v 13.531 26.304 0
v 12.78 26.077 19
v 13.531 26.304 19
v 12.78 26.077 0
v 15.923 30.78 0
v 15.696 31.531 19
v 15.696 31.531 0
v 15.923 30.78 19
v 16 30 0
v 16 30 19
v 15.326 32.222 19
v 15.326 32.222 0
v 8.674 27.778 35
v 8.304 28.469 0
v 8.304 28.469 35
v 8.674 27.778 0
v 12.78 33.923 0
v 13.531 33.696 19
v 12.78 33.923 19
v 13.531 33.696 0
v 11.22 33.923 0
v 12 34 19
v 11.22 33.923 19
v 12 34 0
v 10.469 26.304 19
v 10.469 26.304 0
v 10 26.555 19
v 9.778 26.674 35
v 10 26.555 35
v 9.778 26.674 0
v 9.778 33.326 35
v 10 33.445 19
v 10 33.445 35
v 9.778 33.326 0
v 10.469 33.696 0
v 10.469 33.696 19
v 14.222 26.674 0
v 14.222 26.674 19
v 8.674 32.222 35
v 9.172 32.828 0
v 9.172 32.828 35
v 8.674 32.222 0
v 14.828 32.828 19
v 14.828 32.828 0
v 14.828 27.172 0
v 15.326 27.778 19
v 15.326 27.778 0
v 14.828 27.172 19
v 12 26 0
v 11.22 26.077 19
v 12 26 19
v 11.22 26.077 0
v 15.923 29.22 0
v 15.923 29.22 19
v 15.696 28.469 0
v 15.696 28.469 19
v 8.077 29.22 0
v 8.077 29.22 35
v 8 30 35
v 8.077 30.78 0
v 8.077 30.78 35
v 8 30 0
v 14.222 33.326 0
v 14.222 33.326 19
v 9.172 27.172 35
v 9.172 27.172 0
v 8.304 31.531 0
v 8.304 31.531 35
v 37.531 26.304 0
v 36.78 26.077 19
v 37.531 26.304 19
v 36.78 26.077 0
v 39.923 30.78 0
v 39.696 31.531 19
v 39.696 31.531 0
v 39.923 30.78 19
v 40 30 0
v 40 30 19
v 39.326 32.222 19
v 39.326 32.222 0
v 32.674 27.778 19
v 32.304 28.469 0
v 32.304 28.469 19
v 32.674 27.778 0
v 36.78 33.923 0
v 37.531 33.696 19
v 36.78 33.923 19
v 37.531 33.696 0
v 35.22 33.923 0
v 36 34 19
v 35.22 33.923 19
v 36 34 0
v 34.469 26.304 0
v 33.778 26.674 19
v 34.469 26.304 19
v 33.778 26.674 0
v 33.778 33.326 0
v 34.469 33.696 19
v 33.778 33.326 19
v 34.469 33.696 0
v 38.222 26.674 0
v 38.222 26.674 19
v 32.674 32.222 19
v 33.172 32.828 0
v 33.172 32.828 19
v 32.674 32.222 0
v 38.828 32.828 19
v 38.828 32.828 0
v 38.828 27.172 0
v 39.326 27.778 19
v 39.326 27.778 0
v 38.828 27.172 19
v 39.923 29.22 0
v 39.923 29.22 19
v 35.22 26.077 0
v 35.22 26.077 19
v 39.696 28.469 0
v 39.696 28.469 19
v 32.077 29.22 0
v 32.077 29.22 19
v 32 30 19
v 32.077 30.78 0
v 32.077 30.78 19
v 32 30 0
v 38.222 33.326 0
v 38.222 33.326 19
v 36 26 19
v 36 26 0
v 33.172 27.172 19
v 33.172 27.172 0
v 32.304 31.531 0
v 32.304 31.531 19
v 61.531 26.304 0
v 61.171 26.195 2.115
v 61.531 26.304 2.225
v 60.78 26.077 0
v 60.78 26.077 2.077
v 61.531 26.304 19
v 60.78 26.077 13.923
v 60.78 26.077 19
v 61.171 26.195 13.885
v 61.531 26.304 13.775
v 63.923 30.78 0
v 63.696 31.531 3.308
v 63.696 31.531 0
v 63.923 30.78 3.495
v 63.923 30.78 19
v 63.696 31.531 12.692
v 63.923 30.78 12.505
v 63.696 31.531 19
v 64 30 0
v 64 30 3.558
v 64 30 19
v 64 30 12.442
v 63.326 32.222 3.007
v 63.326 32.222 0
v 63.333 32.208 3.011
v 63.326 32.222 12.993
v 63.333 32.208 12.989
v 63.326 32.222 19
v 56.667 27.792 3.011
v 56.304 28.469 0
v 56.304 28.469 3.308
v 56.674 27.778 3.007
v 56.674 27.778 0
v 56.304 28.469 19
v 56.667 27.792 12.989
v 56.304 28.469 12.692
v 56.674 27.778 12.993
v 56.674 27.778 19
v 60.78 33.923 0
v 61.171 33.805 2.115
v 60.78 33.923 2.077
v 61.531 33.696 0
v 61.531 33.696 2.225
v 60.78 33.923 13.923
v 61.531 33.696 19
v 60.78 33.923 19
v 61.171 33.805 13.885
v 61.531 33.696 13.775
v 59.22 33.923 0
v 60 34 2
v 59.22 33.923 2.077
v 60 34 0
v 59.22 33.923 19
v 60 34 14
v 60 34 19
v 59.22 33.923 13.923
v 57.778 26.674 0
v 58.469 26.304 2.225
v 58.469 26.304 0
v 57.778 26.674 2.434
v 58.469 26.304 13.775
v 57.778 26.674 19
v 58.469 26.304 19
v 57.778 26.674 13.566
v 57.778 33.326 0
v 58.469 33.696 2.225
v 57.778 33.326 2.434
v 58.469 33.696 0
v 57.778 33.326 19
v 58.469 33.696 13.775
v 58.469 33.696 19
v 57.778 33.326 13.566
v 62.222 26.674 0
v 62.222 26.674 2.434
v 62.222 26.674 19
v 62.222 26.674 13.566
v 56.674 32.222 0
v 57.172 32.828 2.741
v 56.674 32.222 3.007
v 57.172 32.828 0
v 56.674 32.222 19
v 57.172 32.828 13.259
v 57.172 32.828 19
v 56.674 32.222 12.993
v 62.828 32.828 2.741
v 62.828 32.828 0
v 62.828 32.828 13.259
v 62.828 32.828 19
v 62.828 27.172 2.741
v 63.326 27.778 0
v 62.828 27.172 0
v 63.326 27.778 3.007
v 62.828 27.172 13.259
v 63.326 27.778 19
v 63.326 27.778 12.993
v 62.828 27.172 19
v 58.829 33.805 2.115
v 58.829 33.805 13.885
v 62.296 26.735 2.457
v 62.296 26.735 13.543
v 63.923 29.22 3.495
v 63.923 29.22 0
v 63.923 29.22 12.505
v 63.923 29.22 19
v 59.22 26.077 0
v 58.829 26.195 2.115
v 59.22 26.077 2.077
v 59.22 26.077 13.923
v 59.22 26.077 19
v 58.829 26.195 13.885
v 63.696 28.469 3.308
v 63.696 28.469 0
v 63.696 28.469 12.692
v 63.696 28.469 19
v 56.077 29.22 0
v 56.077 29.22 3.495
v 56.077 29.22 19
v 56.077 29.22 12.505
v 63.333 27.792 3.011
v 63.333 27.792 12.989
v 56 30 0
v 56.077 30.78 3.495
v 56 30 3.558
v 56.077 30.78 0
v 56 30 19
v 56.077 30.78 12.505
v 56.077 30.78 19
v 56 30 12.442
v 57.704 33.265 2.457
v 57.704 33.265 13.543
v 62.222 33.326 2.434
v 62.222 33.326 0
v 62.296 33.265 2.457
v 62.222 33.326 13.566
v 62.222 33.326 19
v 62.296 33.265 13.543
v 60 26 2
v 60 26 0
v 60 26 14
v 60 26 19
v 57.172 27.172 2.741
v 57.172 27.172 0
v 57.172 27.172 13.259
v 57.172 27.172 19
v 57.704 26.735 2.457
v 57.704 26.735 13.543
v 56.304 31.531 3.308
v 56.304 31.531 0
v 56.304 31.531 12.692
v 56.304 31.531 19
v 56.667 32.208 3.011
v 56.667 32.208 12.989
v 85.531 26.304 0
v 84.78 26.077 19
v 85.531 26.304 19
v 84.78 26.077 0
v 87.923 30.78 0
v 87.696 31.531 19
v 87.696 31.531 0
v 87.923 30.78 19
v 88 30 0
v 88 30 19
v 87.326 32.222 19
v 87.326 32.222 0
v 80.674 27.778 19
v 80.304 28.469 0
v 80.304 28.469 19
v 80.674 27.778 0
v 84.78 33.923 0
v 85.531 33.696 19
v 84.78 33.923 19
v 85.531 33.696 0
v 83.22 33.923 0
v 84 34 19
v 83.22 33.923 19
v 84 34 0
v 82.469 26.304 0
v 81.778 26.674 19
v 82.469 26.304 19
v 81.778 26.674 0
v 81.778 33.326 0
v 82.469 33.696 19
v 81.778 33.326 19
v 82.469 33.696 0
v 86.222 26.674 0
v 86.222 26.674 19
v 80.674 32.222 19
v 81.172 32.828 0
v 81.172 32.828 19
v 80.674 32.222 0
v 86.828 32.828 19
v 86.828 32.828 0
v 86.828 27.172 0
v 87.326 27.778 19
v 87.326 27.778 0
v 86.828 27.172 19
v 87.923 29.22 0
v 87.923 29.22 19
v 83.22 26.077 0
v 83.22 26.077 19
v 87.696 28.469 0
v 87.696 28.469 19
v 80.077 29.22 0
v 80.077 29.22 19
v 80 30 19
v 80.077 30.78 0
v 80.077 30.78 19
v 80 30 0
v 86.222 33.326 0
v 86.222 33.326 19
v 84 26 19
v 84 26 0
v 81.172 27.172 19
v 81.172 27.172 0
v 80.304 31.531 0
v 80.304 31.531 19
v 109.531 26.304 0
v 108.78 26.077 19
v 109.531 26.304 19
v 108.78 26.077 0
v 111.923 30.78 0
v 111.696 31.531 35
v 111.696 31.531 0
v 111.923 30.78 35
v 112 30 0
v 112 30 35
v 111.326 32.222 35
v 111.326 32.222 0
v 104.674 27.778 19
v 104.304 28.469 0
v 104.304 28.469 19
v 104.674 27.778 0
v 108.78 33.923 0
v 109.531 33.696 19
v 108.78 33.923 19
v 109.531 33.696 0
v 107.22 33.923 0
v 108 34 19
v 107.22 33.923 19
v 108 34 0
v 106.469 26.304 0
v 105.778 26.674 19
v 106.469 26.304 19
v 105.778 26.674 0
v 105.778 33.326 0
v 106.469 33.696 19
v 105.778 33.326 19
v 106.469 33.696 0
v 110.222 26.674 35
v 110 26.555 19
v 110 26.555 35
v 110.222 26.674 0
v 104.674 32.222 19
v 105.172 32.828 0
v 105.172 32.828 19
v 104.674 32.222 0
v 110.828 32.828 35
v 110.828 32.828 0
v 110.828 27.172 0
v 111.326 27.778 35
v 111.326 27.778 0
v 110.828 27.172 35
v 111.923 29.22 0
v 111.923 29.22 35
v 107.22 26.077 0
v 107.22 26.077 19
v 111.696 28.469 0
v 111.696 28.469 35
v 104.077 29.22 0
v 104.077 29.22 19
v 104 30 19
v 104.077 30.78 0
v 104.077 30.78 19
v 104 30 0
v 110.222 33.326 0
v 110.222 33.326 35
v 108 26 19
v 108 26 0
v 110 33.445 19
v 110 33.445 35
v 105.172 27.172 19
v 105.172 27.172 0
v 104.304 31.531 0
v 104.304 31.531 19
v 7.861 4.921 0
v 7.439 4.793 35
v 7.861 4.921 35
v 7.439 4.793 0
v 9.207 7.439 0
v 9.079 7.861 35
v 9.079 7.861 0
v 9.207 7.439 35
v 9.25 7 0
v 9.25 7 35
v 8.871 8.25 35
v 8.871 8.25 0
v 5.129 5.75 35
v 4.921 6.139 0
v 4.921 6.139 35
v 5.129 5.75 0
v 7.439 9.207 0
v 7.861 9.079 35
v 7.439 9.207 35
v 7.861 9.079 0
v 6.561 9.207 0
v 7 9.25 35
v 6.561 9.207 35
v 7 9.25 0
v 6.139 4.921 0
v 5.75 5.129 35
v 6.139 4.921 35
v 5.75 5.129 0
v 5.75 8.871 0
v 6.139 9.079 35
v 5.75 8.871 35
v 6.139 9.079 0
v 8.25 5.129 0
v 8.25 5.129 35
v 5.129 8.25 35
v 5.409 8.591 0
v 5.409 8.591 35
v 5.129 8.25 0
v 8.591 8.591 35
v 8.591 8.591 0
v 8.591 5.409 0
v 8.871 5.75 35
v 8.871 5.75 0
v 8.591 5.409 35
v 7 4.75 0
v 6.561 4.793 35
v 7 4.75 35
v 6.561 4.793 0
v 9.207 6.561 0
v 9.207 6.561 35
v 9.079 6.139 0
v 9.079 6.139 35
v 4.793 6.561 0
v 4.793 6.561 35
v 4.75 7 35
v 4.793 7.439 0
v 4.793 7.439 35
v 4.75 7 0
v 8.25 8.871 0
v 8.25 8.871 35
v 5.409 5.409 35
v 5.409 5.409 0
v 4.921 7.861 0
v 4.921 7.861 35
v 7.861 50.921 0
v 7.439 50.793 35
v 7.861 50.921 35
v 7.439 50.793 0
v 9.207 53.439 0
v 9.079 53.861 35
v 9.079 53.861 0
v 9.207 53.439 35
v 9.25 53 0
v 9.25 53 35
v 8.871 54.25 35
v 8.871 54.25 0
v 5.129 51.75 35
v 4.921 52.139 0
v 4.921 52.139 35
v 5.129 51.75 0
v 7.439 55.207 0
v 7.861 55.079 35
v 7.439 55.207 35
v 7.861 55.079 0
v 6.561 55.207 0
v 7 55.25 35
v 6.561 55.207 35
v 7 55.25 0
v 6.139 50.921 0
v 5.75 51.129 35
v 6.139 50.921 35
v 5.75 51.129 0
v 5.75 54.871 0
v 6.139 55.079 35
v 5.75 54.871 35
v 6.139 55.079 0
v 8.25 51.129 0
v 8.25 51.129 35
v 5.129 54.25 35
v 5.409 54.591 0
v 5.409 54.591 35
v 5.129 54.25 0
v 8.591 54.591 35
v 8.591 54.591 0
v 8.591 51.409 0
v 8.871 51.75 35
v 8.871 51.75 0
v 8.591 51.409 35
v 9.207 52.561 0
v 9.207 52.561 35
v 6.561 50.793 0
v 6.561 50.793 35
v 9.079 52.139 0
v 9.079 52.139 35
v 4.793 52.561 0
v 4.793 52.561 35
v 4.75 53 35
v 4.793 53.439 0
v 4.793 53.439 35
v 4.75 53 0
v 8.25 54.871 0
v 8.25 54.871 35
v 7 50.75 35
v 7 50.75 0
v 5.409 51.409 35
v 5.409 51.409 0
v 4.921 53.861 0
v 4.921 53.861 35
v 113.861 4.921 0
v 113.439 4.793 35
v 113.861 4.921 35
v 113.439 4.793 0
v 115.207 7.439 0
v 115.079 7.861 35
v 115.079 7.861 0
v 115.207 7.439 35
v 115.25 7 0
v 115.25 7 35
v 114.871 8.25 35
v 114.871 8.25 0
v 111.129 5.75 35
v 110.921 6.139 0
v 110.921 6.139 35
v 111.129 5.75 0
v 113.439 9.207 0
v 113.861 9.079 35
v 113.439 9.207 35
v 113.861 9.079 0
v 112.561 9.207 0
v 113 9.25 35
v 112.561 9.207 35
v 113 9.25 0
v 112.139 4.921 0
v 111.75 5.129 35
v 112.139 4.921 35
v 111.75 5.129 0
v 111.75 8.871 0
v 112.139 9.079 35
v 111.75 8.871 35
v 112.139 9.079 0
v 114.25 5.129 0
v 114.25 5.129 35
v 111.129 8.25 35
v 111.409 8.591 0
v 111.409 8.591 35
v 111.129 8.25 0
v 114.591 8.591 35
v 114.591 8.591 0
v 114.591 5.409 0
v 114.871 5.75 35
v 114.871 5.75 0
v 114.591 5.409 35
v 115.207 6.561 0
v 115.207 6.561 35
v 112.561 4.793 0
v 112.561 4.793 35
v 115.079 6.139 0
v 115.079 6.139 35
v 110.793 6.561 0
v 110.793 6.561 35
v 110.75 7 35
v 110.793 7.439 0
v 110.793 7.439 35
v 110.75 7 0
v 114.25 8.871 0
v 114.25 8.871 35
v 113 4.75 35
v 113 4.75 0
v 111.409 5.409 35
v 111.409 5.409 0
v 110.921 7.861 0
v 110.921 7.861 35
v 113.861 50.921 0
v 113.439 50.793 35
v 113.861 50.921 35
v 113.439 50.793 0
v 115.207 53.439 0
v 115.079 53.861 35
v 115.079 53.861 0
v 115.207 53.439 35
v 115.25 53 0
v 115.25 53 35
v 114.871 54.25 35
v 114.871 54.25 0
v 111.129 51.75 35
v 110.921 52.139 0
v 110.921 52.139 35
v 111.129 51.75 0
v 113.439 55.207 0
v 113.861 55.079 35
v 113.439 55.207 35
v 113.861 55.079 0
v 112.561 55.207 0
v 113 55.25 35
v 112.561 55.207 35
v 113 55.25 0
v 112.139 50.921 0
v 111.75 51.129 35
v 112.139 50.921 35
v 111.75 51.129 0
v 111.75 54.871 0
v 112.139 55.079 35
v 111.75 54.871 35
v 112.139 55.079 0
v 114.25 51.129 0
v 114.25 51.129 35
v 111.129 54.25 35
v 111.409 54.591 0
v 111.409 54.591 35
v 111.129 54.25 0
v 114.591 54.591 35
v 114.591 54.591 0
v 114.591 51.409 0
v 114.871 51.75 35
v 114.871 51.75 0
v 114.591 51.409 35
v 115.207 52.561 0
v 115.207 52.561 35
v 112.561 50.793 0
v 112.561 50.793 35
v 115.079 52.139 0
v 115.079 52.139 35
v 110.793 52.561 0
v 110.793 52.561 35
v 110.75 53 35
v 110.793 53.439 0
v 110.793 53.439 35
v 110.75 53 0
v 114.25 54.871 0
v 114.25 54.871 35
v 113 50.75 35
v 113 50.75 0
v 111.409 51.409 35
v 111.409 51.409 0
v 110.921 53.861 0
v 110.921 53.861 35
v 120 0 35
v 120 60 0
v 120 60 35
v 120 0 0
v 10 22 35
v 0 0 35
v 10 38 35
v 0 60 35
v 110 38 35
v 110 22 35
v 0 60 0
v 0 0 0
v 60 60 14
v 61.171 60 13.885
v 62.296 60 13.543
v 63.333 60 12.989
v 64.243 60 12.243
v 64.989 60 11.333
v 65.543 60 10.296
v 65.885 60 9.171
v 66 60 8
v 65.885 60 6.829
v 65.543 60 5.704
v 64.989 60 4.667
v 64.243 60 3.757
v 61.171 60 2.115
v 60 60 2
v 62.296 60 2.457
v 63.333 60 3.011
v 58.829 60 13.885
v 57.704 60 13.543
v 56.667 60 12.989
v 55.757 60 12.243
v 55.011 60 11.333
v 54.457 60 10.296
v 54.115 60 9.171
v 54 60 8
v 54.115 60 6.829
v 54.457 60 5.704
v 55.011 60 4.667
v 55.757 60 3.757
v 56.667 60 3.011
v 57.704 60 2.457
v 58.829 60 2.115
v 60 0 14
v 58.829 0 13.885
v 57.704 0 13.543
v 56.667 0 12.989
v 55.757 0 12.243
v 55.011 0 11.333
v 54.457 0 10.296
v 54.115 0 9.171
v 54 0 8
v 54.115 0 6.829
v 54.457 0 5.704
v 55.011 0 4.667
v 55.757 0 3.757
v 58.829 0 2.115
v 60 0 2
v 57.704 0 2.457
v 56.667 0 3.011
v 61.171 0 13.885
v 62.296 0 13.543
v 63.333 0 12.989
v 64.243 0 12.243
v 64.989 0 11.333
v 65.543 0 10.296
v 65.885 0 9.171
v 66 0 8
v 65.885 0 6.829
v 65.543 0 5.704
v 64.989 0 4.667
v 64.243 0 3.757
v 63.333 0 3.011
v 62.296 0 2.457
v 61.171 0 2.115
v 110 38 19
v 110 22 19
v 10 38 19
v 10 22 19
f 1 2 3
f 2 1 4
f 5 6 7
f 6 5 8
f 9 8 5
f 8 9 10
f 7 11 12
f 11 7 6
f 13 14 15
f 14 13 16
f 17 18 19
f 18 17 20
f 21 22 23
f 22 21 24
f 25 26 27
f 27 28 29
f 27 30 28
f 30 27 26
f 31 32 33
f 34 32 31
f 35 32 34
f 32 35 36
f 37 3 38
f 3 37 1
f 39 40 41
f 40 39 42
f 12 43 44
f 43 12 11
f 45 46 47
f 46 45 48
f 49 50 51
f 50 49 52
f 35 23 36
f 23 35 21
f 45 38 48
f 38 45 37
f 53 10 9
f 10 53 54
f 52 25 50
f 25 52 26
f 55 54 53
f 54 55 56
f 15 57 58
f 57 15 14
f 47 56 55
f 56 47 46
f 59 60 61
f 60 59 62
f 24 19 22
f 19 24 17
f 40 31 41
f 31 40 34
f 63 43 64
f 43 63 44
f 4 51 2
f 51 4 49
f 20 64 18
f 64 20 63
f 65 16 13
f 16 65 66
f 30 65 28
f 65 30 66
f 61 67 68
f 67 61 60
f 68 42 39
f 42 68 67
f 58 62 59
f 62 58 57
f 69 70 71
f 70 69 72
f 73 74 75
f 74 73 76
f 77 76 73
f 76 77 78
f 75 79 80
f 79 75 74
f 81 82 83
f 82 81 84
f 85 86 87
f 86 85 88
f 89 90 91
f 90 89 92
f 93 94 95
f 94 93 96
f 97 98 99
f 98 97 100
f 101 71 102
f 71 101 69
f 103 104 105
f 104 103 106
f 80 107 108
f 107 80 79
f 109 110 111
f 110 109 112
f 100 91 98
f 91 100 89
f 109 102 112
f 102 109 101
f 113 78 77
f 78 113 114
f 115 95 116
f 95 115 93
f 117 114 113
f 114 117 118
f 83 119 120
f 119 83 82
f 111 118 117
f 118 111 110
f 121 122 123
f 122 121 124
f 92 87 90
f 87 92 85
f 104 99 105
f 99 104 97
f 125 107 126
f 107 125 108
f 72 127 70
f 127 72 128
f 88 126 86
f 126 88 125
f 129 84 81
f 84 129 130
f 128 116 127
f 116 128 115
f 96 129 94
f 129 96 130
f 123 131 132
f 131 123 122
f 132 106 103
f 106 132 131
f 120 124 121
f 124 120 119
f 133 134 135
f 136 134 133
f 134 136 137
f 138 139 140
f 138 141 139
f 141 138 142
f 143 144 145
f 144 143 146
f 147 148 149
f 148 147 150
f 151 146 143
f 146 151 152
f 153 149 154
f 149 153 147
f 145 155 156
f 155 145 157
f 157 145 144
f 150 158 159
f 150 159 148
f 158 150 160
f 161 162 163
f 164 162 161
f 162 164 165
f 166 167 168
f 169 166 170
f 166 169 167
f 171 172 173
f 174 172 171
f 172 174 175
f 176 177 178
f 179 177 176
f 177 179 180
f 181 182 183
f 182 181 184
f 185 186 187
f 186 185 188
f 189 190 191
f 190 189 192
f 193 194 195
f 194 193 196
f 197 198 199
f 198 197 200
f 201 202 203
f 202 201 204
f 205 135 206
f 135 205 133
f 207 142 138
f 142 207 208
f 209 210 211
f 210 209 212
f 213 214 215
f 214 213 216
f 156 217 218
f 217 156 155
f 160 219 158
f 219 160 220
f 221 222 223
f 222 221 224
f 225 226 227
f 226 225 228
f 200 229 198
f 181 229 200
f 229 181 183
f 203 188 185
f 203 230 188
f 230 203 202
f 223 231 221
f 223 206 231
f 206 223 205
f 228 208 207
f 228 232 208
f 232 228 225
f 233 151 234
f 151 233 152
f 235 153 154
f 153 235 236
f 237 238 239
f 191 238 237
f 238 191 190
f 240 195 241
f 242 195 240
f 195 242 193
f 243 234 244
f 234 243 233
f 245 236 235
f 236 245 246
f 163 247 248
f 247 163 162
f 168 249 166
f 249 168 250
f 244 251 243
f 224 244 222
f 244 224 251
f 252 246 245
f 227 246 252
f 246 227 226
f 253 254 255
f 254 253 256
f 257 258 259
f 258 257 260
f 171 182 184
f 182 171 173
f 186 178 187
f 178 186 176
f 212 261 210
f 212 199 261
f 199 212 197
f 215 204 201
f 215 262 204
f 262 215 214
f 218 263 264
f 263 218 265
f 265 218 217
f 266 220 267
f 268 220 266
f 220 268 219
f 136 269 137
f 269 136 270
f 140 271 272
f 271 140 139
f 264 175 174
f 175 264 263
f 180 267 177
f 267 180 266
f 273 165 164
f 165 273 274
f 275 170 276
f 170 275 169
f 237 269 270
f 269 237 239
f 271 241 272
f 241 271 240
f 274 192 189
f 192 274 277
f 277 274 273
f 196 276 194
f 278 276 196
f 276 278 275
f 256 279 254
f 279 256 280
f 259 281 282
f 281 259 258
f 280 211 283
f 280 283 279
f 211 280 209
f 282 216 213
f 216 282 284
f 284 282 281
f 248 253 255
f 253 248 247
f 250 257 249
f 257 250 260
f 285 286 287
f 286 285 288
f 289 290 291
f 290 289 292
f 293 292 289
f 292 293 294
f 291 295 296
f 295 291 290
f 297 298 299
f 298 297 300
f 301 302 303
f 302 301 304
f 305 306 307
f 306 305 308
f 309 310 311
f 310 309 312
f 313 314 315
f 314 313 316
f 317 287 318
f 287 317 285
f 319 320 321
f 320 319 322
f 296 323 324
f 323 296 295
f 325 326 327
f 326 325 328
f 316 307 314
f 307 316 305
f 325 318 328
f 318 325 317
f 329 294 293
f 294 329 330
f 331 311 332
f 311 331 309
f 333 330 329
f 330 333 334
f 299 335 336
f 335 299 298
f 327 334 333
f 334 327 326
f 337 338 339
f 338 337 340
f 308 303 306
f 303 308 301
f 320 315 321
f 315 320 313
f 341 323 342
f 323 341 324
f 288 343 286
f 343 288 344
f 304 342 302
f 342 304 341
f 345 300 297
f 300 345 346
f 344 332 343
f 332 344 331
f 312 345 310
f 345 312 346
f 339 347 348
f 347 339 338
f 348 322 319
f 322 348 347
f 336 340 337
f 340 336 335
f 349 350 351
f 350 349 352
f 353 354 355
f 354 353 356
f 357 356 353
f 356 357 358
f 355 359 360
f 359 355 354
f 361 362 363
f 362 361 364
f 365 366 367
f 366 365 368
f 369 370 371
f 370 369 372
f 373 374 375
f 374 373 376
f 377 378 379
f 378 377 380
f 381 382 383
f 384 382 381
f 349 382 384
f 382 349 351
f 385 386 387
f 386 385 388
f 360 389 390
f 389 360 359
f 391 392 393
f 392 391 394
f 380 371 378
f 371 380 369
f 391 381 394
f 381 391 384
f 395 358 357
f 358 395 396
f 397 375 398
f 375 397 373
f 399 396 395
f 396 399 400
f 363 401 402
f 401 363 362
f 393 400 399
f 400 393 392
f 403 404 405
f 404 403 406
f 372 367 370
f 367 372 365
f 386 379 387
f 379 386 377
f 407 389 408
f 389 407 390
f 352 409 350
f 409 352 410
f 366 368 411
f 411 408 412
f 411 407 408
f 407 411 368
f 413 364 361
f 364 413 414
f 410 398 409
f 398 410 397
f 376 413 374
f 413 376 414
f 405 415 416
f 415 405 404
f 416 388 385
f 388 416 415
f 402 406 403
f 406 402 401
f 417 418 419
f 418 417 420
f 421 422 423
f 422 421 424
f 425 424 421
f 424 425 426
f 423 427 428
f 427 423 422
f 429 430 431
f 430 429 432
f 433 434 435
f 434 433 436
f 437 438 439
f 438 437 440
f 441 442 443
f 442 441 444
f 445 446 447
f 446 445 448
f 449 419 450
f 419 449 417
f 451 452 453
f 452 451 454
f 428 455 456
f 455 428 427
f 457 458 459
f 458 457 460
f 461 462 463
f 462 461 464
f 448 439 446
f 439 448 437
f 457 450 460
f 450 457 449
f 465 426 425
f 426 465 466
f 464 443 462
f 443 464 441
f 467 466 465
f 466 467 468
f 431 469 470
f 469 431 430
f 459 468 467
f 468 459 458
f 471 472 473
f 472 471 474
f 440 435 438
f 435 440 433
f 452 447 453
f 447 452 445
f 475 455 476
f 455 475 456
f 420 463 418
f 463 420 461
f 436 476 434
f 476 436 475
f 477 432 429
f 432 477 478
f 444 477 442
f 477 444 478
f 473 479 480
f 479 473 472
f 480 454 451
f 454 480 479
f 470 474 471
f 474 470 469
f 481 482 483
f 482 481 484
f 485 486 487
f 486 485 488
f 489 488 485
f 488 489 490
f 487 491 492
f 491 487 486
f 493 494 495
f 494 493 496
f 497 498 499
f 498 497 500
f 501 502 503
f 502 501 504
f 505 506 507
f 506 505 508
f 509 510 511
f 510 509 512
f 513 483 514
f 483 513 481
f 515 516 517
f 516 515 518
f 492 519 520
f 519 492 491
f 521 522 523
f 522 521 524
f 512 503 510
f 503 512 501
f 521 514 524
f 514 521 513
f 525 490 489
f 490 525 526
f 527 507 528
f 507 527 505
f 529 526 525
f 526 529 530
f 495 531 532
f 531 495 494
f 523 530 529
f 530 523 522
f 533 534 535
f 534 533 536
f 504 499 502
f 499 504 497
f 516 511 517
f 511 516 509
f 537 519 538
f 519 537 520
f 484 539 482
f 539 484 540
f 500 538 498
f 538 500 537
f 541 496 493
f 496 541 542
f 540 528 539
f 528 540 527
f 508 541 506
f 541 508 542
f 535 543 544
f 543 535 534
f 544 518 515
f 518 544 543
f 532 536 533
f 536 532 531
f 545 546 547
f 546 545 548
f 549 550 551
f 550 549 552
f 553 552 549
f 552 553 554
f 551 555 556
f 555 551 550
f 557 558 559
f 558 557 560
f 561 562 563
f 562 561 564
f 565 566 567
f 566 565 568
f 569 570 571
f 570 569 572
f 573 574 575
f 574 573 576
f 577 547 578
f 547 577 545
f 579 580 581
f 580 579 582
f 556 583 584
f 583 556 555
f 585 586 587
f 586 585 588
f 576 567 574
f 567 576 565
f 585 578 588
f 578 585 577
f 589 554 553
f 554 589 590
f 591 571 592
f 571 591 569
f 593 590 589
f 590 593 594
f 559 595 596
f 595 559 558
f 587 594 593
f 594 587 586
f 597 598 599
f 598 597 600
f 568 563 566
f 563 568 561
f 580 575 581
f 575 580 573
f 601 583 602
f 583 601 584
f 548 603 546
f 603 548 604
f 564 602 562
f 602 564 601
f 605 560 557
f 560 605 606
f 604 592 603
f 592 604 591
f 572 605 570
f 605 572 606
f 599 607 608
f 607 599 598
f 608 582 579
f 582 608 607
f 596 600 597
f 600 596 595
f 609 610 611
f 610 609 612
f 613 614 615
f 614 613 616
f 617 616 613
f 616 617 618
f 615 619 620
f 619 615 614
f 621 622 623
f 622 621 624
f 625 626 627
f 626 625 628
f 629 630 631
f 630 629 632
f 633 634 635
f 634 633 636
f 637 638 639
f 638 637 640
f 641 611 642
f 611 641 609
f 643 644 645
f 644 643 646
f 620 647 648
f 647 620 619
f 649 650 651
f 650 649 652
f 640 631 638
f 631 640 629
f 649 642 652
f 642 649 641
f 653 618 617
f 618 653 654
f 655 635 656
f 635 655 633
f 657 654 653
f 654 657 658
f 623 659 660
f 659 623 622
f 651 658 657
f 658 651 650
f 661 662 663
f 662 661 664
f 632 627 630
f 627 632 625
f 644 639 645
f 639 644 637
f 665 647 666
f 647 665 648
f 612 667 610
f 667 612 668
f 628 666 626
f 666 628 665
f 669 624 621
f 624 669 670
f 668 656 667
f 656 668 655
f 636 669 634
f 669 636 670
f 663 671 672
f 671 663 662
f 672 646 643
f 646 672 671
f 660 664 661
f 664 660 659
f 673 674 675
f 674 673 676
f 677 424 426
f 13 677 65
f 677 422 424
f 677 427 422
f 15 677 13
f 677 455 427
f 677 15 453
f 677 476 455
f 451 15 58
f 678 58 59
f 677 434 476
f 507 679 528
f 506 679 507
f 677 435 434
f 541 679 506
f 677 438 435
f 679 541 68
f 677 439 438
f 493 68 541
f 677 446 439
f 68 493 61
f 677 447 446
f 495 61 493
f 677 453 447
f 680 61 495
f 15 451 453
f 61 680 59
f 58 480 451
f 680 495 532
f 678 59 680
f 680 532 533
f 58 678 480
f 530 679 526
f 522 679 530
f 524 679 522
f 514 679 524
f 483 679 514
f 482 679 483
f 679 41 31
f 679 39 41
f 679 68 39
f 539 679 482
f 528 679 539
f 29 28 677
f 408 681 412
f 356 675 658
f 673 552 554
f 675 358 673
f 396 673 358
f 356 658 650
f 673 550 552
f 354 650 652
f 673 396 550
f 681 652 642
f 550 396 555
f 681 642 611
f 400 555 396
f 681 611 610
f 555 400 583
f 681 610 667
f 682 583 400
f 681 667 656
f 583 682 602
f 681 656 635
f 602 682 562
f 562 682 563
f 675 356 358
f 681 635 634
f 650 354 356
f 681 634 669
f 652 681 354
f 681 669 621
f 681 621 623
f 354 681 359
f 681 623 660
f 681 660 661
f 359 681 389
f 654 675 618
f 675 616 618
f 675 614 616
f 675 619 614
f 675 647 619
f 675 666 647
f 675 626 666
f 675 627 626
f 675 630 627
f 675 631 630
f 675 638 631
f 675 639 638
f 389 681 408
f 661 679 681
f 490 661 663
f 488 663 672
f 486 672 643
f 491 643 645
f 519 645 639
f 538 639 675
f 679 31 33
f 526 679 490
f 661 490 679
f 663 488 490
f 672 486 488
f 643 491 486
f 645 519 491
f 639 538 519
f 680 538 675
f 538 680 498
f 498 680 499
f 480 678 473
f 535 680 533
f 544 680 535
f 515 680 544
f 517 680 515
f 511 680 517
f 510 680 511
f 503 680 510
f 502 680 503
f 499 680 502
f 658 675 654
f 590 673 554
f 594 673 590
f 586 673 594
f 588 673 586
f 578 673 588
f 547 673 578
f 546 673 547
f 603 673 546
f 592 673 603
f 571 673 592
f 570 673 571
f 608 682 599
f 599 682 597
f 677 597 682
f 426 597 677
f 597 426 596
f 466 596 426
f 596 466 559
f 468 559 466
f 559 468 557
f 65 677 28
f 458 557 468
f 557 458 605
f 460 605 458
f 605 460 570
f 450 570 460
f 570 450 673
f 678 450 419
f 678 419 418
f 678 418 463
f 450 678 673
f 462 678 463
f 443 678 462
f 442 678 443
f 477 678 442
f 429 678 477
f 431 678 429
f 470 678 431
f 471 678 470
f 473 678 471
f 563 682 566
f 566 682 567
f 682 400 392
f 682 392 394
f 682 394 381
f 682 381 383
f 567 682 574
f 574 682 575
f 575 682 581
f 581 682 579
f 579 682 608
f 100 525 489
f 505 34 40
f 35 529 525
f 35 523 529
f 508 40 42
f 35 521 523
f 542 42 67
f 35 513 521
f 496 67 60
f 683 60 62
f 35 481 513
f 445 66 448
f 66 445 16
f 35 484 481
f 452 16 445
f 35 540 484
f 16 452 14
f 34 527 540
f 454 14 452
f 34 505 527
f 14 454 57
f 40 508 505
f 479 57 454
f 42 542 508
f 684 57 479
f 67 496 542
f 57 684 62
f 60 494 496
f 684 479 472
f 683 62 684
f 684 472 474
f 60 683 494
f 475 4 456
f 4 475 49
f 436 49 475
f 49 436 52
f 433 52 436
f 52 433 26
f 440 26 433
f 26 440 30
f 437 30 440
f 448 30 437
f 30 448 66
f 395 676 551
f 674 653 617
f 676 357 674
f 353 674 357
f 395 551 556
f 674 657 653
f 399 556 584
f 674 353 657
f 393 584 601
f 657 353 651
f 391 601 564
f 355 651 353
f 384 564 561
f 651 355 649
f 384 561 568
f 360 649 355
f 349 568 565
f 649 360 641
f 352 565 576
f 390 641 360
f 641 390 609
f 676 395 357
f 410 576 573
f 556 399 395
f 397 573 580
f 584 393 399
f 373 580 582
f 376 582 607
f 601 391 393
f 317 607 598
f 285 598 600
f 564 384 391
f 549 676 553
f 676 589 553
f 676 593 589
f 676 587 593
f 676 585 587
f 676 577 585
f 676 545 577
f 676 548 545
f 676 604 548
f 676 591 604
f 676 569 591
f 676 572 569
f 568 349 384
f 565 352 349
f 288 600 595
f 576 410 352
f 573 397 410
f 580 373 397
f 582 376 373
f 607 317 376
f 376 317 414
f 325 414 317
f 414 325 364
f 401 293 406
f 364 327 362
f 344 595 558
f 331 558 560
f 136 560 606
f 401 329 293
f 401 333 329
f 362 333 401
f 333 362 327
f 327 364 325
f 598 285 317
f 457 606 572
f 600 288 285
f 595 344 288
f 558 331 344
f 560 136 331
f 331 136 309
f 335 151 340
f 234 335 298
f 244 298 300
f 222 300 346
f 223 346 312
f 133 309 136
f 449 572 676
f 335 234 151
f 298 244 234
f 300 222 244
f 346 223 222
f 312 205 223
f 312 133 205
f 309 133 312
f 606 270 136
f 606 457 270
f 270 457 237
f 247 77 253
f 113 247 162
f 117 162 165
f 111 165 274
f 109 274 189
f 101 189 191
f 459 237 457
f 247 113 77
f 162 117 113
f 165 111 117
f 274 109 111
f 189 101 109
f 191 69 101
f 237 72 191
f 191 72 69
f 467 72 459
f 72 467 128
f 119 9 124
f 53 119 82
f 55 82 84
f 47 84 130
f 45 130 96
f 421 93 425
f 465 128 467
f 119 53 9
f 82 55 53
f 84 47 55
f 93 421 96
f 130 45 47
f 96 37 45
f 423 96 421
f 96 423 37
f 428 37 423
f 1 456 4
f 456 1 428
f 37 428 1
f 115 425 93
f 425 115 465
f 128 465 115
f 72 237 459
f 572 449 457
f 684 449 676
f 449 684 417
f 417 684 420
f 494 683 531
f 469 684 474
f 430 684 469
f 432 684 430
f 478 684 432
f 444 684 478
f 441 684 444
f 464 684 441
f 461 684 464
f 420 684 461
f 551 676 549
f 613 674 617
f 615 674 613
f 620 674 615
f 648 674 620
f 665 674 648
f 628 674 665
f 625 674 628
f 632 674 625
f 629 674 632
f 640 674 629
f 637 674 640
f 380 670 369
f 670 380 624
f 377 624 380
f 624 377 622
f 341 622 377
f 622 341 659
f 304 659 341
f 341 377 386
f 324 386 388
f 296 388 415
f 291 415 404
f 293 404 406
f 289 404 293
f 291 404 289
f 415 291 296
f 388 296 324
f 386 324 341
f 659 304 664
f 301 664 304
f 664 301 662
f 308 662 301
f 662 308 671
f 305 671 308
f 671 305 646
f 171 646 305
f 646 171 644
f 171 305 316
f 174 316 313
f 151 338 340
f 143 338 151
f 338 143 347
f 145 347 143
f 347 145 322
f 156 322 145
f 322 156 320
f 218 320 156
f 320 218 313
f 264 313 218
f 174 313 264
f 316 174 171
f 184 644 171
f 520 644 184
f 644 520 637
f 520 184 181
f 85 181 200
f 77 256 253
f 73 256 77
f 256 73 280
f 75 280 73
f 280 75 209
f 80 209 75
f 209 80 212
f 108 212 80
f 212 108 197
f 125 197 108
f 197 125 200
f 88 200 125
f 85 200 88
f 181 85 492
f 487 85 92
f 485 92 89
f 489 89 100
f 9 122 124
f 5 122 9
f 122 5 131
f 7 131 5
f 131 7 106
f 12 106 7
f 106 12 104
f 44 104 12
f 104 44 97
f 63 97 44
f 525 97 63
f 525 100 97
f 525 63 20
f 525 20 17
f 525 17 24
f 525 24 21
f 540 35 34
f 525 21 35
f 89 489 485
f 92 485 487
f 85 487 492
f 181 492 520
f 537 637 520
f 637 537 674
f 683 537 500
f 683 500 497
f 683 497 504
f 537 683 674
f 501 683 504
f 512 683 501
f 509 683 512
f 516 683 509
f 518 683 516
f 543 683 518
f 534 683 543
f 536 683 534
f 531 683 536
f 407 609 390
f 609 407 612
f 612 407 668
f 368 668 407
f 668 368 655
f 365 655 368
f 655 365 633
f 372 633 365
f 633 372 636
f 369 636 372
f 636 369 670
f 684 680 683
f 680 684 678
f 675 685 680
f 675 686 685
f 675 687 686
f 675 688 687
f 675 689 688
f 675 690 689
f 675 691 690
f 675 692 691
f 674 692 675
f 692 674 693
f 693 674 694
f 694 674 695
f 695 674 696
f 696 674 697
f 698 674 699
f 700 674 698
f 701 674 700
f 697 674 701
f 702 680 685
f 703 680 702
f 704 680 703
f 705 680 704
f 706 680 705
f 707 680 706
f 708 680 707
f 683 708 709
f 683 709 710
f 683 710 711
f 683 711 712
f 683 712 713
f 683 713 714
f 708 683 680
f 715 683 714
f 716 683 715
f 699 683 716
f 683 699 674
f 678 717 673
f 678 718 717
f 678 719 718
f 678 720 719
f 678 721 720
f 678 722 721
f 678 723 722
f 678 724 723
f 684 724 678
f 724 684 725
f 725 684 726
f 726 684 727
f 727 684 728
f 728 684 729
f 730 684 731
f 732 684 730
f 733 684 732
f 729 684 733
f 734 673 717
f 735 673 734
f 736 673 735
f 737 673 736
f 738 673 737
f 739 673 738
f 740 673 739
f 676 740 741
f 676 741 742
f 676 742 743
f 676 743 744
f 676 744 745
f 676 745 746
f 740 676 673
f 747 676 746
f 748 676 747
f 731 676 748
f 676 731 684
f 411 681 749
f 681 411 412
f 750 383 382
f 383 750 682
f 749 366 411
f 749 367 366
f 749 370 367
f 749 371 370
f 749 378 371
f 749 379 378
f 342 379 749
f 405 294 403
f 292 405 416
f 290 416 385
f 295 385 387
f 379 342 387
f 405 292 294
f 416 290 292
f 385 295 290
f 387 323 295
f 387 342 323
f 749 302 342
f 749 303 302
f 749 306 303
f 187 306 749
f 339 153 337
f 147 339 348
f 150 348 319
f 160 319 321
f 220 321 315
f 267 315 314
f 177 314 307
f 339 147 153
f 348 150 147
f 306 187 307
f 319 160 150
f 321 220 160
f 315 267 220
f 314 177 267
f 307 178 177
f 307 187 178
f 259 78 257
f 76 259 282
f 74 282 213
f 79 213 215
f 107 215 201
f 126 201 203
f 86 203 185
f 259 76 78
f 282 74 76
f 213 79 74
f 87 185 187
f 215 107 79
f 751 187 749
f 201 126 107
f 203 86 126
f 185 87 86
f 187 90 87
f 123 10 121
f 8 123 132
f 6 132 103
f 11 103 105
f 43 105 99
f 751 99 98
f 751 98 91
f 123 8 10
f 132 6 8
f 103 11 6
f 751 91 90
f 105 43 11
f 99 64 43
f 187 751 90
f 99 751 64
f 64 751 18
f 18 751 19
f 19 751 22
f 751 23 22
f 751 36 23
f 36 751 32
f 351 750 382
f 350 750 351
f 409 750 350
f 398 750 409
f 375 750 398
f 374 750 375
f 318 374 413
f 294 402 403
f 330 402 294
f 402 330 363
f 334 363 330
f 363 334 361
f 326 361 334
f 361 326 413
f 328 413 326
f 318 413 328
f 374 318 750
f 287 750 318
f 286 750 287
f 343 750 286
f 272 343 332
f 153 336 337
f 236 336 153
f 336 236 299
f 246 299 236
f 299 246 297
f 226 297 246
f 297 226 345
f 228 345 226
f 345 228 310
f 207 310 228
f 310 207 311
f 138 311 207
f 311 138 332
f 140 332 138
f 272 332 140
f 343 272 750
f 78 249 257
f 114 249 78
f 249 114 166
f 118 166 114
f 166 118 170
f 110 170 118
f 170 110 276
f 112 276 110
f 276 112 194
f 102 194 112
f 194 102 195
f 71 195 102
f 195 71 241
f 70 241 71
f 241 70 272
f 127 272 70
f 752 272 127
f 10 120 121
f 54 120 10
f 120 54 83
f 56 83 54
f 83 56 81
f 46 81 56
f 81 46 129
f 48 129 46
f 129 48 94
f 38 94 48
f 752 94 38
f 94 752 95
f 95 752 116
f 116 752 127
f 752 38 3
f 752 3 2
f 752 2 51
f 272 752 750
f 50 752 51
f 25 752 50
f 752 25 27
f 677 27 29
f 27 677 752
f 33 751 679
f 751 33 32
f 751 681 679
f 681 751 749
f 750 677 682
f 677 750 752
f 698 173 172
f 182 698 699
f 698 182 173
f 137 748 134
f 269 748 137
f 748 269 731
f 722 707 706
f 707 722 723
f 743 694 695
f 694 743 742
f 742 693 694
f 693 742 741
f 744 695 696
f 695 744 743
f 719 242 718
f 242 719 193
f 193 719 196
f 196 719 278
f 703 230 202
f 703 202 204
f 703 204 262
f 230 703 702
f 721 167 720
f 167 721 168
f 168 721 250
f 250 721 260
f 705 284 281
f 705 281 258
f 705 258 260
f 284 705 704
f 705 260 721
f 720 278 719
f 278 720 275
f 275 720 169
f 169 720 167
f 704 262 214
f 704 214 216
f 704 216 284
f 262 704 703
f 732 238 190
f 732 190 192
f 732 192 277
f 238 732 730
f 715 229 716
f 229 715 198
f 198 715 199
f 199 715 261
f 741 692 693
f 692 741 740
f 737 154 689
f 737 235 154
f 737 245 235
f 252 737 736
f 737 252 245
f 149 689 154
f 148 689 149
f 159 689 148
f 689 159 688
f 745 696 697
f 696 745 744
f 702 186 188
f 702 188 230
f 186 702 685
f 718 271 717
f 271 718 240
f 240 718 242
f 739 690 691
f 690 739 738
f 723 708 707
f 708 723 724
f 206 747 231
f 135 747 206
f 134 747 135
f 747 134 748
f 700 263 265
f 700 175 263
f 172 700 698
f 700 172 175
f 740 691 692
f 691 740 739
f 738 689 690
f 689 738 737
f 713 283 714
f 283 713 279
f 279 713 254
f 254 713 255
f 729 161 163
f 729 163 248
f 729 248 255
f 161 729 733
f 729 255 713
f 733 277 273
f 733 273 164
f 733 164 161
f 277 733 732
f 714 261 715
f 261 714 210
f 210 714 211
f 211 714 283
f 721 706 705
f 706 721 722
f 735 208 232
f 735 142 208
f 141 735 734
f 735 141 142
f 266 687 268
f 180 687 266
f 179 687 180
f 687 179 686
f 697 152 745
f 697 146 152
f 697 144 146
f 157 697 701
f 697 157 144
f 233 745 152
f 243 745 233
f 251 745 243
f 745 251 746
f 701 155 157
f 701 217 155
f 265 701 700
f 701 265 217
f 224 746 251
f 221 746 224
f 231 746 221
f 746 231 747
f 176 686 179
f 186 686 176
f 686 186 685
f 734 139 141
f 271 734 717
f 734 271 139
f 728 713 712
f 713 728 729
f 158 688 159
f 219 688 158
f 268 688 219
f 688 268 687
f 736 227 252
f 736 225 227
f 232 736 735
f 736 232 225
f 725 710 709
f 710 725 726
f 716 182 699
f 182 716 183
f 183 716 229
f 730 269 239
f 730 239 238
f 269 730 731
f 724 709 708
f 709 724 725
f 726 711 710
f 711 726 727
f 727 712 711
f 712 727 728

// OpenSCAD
$fn = 32;

// ----------------------------------------------------------------------
// Manifold block: side_outlet manifold
// ----------------------------------------------------------------------

// --- parameters (mm) ---
block_l = 120;            // block length, X
block_w = 60;             // block width, Y
block_h = 35;             // block height, Z
port_d = 8;               // port bore diameter
port_pitch = 24;          // port pitch along X
gallery_d = 16;           // top gallery width, Y
gallery_depth = 16;       // gallery pocket depth
wall_p = 10;              // gallery end wall thickness, X
mnt_d = 4.5;              // mounting hole diameter
mnt_in = 7;               // mounting hole inset from the edges
out_d = 12;               // outlet bore diameter
out_z = 8;                // outlet axis height
fit_tol = 0.05;           // tolerance for press fits, mm
free_tol = 0.2;           // tolerance for clearance fits, mm

n_ports = 5;  // ports in the row
port_x0 = (block_l - (n_ports - 1) * port_pitch) / 2;  // first port X

difference() {
  cube([block_l, block_w, block_h]);
  for (i = [0 : n_ports - 1])
    translate([port_x0 + i * port_pitch, block_w / 2, -1])
      cylinder(h = block_h + 2, d = port_d);
  translate([wall_p, block_w / 2 - gallery_d / 2, block_h - gallery_depth])
    cube([block_l - 2 * wall_p, gallery_d, gallery_depth + 1]);
  for (cx = [mnt_in, block_l - mnt_in])
    for (cy = [mnt_in, block_w - mnt_in])
      translate([cx, cy, -1]) cylinder(h = block_h + 2, d = mnt_d);
  translate([block_l / 2, -1, out_z]) rotate([-90, 0, 0])
    cylinder(h = block_w + 2, d = out_d);
}
